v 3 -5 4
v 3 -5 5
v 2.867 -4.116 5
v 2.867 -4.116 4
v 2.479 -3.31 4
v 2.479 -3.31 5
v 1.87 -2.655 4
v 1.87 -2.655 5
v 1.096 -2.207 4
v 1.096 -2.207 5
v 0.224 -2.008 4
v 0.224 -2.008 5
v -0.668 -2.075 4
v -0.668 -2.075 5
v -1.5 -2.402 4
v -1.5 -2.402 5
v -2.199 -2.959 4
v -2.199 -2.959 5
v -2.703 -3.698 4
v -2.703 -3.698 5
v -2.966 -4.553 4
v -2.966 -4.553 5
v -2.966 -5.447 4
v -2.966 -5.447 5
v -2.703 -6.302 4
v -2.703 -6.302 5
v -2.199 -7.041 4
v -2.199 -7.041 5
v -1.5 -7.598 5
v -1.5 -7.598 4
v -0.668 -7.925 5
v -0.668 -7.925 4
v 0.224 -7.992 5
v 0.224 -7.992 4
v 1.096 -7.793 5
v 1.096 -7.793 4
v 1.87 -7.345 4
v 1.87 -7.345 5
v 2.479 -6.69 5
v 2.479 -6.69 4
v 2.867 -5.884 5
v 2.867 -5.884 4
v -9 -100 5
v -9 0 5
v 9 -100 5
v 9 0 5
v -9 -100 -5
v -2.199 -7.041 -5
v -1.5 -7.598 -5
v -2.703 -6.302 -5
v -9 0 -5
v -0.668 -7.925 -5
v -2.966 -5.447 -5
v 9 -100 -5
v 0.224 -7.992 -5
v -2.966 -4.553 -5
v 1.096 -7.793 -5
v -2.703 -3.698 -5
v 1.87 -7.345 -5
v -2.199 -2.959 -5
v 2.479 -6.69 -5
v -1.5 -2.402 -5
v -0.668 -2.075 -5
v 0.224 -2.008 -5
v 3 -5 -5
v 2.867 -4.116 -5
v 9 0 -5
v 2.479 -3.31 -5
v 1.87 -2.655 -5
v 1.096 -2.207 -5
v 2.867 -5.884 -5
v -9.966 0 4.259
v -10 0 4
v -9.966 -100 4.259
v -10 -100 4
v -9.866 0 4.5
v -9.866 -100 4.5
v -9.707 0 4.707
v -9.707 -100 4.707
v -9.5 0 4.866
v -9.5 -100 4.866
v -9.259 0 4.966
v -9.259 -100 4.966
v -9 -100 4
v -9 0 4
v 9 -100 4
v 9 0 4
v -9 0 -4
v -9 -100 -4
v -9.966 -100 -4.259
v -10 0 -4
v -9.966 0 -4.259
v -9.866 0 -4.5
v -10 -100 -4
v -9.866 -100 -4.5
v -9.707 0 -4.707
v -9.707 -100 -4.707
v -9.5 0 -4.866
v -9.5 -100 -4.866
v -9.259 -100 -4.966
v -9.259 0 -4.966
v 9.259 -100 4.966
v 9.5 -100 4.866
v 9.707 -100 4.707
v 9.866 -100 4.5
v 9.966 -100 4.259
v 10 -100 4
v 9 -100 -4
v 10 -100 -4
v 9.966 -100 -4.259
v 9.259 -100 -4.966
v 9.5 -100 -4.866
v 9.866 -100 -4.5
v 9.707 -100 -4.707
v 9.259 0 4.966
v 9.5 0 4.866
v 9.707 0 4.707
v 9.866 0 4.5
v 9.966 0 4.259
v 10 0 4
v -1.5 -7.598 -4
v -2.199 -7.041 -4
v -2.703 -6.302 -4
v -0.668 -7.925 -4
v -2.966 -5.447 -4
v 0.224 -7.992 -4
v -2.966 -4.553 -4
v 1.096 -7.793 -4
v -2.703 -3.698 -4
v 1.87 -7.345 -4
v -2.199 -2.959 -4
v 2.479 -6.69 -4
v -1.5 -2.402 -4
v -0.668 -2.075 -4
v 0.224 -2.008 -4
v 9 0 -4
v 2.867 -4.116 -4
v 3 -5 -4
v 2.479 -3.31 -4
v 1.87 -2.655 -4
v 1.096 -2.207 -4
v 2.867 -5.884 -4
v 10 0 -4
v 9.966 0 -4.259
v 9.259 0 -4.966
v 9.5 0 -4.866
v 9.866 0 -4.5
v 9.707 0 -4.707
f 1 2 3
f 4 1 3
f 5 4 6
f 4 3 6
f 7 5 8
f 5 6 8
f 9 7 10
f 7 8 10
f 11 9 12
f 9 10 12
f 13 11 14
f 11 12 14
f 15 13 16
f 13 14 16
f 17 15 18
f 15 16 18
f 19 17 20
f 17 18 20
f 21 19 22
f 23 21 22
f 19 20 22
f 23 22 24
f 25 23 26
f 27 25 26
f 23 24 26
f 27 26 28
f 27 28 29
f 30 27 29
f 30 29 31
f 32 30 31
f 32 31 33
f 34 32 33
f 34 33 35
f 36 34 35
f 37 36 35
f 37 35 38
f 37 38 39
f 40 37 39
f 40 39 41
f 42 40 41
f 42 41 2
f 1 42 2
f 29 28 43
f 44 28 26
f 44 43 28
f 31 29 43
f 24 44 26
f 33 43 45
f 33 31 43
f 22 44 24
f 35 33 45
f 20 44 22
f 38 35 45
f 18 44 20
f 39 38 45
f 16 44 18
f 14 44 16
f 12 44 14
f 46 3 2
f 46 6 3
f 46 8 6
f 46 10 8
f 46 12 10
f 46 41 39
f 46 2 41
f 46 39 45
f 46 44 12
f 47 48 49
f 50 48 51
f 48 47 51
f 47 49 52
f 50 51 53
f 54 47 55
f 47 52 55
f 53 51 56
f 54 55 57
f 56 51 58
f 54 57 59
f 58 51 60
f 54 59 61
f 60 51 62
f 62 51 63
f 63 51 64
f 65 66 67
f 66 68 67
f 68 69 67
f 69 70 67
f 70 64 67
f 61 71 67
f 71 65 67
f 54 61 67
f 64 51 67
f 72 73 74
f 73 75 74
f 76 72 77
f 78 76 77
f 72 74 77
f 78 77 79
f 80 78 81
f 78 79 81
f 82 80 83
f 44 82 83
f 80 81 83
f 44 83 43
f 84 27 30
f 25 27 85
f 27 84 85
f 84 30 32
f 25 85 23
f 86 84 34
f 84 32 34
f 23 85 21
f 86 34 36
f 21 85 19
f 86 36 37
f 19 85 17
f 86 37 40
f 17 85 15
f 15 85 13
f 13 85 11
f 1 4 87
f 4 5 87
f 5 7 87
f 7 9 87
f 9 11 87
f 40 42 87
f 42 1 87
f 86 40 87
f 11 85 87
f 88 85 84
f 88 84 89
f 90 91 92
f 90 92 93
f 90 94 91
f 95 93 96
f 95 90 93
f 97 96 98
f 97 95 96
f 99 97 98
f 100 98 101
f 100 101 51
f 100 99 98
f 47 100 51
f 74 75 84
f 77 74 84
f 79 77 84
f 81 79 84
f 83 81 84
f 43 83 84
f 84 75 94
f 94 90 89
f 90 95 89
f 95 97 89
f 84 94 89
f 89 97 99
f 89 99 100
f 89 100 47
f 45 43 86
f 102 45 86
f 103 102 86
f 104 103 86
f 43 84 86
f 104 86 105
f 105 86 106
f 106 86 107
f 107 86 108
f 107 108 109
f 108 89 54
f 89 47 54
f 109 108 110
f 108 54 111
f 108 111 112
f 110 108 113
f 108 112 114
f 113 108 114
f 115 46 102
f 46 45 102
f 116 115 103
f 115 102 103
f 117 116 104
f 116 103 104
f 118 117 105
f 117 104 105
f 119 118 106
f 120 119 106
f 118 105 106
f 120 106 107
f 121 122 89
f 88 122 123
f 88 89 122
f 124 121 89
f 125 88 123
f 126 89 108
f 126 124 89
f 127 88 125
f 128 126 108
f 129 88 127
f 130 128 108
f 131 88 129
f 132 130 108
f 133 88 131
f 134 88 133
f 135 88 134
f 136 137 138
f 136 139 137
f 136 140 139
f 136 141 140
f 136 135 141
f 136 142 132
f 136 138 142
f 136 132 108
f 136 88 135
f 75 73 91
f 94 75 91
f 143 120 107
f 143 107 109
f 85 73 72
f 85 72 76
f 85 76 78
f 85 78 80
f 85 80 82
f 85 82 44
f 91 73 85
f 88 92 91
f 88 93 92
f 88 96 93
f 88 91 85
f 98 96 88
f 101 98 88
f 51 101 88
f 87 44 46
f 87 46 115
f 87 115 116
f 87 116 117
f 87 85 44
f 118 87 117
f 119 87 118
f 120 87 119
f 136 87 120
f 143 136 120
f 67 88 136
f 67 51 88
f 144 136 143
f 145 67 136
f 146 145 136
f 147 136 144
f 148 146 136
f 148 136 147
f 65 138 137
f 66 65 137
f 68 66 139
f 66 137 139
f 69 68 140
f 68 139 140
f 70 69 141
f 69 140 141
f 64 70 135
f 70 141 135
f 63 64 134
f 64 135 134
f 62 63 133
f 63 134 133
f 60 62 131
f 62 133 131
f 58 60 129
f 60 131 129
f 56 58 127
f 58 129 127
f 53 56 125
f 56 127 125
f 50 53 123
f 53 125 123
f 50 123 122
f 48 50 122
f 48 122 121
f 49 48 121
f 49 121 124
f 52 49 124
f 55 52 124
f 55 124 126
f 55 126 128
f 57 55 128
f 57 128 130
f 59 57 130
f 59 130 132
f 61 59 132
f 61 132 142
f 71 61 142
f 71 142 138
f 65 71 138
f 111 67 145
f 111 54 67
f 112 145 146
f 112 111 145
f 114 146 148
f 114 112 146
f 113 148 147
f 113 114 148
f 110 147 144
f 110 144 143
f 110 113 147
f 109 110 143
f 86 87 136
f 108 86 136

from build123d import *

# Parameters (mm, degrees)
SCHIZZO2_W                = 20
SCHIZZO2_H                = 10
SCHIZZO2_W_2              = 18
SCHIZZO2_H_2              = 8
ESTRUSIONE_SOTTILE1_DEPTH = 100
SCHIZZO3_R                = 3
TAGLIO_ESTRUSIONE1_DEPTH  = 101.995049384
RACCORDO6_R               = 1


with BuildPart() as part:
    # Schizzo2 → Estrusione-Sottile1 (new body)
    with BuildSketch(Plane(origin=(0, 0, 0), x_dir=(1, 0, 0), z_dir=(0, 1, 0))):
        Rectangle(SCHIZZO2_W, SCHIZZO2_H)
        Rectangle(SCHIZZO2_W_2, SCHIZZO2_H_2, mode=Mode.SUBTRACT)
    extrude(amount=-ESTRUSIONE_SOTTILE1_DEPTH)

    # Schizzo3 → Taglio-Estrusione1 (cut, through all)
    with BuildSketch(Plane.XY.offset(5)):
        with Locations((0, -5)):
            Circle(SCHIZZO3_R)
    extrude(amount=-TAGLIO_ESTRUSIONE1_DEPTH, mode=Mode.SUBTRACT)

    # Raccordo6
    raccordo6_edges = [part.edges().sort_by_distance(p)[0] for p in [
        (10, -50, 5),
        (-10, -50, 5),
        (-10, -50, -5),
        (10, -50, -5),
    ]]
    fillet(raccordo6_edges, radius=RACCORDO6_R)


solid = part.part
